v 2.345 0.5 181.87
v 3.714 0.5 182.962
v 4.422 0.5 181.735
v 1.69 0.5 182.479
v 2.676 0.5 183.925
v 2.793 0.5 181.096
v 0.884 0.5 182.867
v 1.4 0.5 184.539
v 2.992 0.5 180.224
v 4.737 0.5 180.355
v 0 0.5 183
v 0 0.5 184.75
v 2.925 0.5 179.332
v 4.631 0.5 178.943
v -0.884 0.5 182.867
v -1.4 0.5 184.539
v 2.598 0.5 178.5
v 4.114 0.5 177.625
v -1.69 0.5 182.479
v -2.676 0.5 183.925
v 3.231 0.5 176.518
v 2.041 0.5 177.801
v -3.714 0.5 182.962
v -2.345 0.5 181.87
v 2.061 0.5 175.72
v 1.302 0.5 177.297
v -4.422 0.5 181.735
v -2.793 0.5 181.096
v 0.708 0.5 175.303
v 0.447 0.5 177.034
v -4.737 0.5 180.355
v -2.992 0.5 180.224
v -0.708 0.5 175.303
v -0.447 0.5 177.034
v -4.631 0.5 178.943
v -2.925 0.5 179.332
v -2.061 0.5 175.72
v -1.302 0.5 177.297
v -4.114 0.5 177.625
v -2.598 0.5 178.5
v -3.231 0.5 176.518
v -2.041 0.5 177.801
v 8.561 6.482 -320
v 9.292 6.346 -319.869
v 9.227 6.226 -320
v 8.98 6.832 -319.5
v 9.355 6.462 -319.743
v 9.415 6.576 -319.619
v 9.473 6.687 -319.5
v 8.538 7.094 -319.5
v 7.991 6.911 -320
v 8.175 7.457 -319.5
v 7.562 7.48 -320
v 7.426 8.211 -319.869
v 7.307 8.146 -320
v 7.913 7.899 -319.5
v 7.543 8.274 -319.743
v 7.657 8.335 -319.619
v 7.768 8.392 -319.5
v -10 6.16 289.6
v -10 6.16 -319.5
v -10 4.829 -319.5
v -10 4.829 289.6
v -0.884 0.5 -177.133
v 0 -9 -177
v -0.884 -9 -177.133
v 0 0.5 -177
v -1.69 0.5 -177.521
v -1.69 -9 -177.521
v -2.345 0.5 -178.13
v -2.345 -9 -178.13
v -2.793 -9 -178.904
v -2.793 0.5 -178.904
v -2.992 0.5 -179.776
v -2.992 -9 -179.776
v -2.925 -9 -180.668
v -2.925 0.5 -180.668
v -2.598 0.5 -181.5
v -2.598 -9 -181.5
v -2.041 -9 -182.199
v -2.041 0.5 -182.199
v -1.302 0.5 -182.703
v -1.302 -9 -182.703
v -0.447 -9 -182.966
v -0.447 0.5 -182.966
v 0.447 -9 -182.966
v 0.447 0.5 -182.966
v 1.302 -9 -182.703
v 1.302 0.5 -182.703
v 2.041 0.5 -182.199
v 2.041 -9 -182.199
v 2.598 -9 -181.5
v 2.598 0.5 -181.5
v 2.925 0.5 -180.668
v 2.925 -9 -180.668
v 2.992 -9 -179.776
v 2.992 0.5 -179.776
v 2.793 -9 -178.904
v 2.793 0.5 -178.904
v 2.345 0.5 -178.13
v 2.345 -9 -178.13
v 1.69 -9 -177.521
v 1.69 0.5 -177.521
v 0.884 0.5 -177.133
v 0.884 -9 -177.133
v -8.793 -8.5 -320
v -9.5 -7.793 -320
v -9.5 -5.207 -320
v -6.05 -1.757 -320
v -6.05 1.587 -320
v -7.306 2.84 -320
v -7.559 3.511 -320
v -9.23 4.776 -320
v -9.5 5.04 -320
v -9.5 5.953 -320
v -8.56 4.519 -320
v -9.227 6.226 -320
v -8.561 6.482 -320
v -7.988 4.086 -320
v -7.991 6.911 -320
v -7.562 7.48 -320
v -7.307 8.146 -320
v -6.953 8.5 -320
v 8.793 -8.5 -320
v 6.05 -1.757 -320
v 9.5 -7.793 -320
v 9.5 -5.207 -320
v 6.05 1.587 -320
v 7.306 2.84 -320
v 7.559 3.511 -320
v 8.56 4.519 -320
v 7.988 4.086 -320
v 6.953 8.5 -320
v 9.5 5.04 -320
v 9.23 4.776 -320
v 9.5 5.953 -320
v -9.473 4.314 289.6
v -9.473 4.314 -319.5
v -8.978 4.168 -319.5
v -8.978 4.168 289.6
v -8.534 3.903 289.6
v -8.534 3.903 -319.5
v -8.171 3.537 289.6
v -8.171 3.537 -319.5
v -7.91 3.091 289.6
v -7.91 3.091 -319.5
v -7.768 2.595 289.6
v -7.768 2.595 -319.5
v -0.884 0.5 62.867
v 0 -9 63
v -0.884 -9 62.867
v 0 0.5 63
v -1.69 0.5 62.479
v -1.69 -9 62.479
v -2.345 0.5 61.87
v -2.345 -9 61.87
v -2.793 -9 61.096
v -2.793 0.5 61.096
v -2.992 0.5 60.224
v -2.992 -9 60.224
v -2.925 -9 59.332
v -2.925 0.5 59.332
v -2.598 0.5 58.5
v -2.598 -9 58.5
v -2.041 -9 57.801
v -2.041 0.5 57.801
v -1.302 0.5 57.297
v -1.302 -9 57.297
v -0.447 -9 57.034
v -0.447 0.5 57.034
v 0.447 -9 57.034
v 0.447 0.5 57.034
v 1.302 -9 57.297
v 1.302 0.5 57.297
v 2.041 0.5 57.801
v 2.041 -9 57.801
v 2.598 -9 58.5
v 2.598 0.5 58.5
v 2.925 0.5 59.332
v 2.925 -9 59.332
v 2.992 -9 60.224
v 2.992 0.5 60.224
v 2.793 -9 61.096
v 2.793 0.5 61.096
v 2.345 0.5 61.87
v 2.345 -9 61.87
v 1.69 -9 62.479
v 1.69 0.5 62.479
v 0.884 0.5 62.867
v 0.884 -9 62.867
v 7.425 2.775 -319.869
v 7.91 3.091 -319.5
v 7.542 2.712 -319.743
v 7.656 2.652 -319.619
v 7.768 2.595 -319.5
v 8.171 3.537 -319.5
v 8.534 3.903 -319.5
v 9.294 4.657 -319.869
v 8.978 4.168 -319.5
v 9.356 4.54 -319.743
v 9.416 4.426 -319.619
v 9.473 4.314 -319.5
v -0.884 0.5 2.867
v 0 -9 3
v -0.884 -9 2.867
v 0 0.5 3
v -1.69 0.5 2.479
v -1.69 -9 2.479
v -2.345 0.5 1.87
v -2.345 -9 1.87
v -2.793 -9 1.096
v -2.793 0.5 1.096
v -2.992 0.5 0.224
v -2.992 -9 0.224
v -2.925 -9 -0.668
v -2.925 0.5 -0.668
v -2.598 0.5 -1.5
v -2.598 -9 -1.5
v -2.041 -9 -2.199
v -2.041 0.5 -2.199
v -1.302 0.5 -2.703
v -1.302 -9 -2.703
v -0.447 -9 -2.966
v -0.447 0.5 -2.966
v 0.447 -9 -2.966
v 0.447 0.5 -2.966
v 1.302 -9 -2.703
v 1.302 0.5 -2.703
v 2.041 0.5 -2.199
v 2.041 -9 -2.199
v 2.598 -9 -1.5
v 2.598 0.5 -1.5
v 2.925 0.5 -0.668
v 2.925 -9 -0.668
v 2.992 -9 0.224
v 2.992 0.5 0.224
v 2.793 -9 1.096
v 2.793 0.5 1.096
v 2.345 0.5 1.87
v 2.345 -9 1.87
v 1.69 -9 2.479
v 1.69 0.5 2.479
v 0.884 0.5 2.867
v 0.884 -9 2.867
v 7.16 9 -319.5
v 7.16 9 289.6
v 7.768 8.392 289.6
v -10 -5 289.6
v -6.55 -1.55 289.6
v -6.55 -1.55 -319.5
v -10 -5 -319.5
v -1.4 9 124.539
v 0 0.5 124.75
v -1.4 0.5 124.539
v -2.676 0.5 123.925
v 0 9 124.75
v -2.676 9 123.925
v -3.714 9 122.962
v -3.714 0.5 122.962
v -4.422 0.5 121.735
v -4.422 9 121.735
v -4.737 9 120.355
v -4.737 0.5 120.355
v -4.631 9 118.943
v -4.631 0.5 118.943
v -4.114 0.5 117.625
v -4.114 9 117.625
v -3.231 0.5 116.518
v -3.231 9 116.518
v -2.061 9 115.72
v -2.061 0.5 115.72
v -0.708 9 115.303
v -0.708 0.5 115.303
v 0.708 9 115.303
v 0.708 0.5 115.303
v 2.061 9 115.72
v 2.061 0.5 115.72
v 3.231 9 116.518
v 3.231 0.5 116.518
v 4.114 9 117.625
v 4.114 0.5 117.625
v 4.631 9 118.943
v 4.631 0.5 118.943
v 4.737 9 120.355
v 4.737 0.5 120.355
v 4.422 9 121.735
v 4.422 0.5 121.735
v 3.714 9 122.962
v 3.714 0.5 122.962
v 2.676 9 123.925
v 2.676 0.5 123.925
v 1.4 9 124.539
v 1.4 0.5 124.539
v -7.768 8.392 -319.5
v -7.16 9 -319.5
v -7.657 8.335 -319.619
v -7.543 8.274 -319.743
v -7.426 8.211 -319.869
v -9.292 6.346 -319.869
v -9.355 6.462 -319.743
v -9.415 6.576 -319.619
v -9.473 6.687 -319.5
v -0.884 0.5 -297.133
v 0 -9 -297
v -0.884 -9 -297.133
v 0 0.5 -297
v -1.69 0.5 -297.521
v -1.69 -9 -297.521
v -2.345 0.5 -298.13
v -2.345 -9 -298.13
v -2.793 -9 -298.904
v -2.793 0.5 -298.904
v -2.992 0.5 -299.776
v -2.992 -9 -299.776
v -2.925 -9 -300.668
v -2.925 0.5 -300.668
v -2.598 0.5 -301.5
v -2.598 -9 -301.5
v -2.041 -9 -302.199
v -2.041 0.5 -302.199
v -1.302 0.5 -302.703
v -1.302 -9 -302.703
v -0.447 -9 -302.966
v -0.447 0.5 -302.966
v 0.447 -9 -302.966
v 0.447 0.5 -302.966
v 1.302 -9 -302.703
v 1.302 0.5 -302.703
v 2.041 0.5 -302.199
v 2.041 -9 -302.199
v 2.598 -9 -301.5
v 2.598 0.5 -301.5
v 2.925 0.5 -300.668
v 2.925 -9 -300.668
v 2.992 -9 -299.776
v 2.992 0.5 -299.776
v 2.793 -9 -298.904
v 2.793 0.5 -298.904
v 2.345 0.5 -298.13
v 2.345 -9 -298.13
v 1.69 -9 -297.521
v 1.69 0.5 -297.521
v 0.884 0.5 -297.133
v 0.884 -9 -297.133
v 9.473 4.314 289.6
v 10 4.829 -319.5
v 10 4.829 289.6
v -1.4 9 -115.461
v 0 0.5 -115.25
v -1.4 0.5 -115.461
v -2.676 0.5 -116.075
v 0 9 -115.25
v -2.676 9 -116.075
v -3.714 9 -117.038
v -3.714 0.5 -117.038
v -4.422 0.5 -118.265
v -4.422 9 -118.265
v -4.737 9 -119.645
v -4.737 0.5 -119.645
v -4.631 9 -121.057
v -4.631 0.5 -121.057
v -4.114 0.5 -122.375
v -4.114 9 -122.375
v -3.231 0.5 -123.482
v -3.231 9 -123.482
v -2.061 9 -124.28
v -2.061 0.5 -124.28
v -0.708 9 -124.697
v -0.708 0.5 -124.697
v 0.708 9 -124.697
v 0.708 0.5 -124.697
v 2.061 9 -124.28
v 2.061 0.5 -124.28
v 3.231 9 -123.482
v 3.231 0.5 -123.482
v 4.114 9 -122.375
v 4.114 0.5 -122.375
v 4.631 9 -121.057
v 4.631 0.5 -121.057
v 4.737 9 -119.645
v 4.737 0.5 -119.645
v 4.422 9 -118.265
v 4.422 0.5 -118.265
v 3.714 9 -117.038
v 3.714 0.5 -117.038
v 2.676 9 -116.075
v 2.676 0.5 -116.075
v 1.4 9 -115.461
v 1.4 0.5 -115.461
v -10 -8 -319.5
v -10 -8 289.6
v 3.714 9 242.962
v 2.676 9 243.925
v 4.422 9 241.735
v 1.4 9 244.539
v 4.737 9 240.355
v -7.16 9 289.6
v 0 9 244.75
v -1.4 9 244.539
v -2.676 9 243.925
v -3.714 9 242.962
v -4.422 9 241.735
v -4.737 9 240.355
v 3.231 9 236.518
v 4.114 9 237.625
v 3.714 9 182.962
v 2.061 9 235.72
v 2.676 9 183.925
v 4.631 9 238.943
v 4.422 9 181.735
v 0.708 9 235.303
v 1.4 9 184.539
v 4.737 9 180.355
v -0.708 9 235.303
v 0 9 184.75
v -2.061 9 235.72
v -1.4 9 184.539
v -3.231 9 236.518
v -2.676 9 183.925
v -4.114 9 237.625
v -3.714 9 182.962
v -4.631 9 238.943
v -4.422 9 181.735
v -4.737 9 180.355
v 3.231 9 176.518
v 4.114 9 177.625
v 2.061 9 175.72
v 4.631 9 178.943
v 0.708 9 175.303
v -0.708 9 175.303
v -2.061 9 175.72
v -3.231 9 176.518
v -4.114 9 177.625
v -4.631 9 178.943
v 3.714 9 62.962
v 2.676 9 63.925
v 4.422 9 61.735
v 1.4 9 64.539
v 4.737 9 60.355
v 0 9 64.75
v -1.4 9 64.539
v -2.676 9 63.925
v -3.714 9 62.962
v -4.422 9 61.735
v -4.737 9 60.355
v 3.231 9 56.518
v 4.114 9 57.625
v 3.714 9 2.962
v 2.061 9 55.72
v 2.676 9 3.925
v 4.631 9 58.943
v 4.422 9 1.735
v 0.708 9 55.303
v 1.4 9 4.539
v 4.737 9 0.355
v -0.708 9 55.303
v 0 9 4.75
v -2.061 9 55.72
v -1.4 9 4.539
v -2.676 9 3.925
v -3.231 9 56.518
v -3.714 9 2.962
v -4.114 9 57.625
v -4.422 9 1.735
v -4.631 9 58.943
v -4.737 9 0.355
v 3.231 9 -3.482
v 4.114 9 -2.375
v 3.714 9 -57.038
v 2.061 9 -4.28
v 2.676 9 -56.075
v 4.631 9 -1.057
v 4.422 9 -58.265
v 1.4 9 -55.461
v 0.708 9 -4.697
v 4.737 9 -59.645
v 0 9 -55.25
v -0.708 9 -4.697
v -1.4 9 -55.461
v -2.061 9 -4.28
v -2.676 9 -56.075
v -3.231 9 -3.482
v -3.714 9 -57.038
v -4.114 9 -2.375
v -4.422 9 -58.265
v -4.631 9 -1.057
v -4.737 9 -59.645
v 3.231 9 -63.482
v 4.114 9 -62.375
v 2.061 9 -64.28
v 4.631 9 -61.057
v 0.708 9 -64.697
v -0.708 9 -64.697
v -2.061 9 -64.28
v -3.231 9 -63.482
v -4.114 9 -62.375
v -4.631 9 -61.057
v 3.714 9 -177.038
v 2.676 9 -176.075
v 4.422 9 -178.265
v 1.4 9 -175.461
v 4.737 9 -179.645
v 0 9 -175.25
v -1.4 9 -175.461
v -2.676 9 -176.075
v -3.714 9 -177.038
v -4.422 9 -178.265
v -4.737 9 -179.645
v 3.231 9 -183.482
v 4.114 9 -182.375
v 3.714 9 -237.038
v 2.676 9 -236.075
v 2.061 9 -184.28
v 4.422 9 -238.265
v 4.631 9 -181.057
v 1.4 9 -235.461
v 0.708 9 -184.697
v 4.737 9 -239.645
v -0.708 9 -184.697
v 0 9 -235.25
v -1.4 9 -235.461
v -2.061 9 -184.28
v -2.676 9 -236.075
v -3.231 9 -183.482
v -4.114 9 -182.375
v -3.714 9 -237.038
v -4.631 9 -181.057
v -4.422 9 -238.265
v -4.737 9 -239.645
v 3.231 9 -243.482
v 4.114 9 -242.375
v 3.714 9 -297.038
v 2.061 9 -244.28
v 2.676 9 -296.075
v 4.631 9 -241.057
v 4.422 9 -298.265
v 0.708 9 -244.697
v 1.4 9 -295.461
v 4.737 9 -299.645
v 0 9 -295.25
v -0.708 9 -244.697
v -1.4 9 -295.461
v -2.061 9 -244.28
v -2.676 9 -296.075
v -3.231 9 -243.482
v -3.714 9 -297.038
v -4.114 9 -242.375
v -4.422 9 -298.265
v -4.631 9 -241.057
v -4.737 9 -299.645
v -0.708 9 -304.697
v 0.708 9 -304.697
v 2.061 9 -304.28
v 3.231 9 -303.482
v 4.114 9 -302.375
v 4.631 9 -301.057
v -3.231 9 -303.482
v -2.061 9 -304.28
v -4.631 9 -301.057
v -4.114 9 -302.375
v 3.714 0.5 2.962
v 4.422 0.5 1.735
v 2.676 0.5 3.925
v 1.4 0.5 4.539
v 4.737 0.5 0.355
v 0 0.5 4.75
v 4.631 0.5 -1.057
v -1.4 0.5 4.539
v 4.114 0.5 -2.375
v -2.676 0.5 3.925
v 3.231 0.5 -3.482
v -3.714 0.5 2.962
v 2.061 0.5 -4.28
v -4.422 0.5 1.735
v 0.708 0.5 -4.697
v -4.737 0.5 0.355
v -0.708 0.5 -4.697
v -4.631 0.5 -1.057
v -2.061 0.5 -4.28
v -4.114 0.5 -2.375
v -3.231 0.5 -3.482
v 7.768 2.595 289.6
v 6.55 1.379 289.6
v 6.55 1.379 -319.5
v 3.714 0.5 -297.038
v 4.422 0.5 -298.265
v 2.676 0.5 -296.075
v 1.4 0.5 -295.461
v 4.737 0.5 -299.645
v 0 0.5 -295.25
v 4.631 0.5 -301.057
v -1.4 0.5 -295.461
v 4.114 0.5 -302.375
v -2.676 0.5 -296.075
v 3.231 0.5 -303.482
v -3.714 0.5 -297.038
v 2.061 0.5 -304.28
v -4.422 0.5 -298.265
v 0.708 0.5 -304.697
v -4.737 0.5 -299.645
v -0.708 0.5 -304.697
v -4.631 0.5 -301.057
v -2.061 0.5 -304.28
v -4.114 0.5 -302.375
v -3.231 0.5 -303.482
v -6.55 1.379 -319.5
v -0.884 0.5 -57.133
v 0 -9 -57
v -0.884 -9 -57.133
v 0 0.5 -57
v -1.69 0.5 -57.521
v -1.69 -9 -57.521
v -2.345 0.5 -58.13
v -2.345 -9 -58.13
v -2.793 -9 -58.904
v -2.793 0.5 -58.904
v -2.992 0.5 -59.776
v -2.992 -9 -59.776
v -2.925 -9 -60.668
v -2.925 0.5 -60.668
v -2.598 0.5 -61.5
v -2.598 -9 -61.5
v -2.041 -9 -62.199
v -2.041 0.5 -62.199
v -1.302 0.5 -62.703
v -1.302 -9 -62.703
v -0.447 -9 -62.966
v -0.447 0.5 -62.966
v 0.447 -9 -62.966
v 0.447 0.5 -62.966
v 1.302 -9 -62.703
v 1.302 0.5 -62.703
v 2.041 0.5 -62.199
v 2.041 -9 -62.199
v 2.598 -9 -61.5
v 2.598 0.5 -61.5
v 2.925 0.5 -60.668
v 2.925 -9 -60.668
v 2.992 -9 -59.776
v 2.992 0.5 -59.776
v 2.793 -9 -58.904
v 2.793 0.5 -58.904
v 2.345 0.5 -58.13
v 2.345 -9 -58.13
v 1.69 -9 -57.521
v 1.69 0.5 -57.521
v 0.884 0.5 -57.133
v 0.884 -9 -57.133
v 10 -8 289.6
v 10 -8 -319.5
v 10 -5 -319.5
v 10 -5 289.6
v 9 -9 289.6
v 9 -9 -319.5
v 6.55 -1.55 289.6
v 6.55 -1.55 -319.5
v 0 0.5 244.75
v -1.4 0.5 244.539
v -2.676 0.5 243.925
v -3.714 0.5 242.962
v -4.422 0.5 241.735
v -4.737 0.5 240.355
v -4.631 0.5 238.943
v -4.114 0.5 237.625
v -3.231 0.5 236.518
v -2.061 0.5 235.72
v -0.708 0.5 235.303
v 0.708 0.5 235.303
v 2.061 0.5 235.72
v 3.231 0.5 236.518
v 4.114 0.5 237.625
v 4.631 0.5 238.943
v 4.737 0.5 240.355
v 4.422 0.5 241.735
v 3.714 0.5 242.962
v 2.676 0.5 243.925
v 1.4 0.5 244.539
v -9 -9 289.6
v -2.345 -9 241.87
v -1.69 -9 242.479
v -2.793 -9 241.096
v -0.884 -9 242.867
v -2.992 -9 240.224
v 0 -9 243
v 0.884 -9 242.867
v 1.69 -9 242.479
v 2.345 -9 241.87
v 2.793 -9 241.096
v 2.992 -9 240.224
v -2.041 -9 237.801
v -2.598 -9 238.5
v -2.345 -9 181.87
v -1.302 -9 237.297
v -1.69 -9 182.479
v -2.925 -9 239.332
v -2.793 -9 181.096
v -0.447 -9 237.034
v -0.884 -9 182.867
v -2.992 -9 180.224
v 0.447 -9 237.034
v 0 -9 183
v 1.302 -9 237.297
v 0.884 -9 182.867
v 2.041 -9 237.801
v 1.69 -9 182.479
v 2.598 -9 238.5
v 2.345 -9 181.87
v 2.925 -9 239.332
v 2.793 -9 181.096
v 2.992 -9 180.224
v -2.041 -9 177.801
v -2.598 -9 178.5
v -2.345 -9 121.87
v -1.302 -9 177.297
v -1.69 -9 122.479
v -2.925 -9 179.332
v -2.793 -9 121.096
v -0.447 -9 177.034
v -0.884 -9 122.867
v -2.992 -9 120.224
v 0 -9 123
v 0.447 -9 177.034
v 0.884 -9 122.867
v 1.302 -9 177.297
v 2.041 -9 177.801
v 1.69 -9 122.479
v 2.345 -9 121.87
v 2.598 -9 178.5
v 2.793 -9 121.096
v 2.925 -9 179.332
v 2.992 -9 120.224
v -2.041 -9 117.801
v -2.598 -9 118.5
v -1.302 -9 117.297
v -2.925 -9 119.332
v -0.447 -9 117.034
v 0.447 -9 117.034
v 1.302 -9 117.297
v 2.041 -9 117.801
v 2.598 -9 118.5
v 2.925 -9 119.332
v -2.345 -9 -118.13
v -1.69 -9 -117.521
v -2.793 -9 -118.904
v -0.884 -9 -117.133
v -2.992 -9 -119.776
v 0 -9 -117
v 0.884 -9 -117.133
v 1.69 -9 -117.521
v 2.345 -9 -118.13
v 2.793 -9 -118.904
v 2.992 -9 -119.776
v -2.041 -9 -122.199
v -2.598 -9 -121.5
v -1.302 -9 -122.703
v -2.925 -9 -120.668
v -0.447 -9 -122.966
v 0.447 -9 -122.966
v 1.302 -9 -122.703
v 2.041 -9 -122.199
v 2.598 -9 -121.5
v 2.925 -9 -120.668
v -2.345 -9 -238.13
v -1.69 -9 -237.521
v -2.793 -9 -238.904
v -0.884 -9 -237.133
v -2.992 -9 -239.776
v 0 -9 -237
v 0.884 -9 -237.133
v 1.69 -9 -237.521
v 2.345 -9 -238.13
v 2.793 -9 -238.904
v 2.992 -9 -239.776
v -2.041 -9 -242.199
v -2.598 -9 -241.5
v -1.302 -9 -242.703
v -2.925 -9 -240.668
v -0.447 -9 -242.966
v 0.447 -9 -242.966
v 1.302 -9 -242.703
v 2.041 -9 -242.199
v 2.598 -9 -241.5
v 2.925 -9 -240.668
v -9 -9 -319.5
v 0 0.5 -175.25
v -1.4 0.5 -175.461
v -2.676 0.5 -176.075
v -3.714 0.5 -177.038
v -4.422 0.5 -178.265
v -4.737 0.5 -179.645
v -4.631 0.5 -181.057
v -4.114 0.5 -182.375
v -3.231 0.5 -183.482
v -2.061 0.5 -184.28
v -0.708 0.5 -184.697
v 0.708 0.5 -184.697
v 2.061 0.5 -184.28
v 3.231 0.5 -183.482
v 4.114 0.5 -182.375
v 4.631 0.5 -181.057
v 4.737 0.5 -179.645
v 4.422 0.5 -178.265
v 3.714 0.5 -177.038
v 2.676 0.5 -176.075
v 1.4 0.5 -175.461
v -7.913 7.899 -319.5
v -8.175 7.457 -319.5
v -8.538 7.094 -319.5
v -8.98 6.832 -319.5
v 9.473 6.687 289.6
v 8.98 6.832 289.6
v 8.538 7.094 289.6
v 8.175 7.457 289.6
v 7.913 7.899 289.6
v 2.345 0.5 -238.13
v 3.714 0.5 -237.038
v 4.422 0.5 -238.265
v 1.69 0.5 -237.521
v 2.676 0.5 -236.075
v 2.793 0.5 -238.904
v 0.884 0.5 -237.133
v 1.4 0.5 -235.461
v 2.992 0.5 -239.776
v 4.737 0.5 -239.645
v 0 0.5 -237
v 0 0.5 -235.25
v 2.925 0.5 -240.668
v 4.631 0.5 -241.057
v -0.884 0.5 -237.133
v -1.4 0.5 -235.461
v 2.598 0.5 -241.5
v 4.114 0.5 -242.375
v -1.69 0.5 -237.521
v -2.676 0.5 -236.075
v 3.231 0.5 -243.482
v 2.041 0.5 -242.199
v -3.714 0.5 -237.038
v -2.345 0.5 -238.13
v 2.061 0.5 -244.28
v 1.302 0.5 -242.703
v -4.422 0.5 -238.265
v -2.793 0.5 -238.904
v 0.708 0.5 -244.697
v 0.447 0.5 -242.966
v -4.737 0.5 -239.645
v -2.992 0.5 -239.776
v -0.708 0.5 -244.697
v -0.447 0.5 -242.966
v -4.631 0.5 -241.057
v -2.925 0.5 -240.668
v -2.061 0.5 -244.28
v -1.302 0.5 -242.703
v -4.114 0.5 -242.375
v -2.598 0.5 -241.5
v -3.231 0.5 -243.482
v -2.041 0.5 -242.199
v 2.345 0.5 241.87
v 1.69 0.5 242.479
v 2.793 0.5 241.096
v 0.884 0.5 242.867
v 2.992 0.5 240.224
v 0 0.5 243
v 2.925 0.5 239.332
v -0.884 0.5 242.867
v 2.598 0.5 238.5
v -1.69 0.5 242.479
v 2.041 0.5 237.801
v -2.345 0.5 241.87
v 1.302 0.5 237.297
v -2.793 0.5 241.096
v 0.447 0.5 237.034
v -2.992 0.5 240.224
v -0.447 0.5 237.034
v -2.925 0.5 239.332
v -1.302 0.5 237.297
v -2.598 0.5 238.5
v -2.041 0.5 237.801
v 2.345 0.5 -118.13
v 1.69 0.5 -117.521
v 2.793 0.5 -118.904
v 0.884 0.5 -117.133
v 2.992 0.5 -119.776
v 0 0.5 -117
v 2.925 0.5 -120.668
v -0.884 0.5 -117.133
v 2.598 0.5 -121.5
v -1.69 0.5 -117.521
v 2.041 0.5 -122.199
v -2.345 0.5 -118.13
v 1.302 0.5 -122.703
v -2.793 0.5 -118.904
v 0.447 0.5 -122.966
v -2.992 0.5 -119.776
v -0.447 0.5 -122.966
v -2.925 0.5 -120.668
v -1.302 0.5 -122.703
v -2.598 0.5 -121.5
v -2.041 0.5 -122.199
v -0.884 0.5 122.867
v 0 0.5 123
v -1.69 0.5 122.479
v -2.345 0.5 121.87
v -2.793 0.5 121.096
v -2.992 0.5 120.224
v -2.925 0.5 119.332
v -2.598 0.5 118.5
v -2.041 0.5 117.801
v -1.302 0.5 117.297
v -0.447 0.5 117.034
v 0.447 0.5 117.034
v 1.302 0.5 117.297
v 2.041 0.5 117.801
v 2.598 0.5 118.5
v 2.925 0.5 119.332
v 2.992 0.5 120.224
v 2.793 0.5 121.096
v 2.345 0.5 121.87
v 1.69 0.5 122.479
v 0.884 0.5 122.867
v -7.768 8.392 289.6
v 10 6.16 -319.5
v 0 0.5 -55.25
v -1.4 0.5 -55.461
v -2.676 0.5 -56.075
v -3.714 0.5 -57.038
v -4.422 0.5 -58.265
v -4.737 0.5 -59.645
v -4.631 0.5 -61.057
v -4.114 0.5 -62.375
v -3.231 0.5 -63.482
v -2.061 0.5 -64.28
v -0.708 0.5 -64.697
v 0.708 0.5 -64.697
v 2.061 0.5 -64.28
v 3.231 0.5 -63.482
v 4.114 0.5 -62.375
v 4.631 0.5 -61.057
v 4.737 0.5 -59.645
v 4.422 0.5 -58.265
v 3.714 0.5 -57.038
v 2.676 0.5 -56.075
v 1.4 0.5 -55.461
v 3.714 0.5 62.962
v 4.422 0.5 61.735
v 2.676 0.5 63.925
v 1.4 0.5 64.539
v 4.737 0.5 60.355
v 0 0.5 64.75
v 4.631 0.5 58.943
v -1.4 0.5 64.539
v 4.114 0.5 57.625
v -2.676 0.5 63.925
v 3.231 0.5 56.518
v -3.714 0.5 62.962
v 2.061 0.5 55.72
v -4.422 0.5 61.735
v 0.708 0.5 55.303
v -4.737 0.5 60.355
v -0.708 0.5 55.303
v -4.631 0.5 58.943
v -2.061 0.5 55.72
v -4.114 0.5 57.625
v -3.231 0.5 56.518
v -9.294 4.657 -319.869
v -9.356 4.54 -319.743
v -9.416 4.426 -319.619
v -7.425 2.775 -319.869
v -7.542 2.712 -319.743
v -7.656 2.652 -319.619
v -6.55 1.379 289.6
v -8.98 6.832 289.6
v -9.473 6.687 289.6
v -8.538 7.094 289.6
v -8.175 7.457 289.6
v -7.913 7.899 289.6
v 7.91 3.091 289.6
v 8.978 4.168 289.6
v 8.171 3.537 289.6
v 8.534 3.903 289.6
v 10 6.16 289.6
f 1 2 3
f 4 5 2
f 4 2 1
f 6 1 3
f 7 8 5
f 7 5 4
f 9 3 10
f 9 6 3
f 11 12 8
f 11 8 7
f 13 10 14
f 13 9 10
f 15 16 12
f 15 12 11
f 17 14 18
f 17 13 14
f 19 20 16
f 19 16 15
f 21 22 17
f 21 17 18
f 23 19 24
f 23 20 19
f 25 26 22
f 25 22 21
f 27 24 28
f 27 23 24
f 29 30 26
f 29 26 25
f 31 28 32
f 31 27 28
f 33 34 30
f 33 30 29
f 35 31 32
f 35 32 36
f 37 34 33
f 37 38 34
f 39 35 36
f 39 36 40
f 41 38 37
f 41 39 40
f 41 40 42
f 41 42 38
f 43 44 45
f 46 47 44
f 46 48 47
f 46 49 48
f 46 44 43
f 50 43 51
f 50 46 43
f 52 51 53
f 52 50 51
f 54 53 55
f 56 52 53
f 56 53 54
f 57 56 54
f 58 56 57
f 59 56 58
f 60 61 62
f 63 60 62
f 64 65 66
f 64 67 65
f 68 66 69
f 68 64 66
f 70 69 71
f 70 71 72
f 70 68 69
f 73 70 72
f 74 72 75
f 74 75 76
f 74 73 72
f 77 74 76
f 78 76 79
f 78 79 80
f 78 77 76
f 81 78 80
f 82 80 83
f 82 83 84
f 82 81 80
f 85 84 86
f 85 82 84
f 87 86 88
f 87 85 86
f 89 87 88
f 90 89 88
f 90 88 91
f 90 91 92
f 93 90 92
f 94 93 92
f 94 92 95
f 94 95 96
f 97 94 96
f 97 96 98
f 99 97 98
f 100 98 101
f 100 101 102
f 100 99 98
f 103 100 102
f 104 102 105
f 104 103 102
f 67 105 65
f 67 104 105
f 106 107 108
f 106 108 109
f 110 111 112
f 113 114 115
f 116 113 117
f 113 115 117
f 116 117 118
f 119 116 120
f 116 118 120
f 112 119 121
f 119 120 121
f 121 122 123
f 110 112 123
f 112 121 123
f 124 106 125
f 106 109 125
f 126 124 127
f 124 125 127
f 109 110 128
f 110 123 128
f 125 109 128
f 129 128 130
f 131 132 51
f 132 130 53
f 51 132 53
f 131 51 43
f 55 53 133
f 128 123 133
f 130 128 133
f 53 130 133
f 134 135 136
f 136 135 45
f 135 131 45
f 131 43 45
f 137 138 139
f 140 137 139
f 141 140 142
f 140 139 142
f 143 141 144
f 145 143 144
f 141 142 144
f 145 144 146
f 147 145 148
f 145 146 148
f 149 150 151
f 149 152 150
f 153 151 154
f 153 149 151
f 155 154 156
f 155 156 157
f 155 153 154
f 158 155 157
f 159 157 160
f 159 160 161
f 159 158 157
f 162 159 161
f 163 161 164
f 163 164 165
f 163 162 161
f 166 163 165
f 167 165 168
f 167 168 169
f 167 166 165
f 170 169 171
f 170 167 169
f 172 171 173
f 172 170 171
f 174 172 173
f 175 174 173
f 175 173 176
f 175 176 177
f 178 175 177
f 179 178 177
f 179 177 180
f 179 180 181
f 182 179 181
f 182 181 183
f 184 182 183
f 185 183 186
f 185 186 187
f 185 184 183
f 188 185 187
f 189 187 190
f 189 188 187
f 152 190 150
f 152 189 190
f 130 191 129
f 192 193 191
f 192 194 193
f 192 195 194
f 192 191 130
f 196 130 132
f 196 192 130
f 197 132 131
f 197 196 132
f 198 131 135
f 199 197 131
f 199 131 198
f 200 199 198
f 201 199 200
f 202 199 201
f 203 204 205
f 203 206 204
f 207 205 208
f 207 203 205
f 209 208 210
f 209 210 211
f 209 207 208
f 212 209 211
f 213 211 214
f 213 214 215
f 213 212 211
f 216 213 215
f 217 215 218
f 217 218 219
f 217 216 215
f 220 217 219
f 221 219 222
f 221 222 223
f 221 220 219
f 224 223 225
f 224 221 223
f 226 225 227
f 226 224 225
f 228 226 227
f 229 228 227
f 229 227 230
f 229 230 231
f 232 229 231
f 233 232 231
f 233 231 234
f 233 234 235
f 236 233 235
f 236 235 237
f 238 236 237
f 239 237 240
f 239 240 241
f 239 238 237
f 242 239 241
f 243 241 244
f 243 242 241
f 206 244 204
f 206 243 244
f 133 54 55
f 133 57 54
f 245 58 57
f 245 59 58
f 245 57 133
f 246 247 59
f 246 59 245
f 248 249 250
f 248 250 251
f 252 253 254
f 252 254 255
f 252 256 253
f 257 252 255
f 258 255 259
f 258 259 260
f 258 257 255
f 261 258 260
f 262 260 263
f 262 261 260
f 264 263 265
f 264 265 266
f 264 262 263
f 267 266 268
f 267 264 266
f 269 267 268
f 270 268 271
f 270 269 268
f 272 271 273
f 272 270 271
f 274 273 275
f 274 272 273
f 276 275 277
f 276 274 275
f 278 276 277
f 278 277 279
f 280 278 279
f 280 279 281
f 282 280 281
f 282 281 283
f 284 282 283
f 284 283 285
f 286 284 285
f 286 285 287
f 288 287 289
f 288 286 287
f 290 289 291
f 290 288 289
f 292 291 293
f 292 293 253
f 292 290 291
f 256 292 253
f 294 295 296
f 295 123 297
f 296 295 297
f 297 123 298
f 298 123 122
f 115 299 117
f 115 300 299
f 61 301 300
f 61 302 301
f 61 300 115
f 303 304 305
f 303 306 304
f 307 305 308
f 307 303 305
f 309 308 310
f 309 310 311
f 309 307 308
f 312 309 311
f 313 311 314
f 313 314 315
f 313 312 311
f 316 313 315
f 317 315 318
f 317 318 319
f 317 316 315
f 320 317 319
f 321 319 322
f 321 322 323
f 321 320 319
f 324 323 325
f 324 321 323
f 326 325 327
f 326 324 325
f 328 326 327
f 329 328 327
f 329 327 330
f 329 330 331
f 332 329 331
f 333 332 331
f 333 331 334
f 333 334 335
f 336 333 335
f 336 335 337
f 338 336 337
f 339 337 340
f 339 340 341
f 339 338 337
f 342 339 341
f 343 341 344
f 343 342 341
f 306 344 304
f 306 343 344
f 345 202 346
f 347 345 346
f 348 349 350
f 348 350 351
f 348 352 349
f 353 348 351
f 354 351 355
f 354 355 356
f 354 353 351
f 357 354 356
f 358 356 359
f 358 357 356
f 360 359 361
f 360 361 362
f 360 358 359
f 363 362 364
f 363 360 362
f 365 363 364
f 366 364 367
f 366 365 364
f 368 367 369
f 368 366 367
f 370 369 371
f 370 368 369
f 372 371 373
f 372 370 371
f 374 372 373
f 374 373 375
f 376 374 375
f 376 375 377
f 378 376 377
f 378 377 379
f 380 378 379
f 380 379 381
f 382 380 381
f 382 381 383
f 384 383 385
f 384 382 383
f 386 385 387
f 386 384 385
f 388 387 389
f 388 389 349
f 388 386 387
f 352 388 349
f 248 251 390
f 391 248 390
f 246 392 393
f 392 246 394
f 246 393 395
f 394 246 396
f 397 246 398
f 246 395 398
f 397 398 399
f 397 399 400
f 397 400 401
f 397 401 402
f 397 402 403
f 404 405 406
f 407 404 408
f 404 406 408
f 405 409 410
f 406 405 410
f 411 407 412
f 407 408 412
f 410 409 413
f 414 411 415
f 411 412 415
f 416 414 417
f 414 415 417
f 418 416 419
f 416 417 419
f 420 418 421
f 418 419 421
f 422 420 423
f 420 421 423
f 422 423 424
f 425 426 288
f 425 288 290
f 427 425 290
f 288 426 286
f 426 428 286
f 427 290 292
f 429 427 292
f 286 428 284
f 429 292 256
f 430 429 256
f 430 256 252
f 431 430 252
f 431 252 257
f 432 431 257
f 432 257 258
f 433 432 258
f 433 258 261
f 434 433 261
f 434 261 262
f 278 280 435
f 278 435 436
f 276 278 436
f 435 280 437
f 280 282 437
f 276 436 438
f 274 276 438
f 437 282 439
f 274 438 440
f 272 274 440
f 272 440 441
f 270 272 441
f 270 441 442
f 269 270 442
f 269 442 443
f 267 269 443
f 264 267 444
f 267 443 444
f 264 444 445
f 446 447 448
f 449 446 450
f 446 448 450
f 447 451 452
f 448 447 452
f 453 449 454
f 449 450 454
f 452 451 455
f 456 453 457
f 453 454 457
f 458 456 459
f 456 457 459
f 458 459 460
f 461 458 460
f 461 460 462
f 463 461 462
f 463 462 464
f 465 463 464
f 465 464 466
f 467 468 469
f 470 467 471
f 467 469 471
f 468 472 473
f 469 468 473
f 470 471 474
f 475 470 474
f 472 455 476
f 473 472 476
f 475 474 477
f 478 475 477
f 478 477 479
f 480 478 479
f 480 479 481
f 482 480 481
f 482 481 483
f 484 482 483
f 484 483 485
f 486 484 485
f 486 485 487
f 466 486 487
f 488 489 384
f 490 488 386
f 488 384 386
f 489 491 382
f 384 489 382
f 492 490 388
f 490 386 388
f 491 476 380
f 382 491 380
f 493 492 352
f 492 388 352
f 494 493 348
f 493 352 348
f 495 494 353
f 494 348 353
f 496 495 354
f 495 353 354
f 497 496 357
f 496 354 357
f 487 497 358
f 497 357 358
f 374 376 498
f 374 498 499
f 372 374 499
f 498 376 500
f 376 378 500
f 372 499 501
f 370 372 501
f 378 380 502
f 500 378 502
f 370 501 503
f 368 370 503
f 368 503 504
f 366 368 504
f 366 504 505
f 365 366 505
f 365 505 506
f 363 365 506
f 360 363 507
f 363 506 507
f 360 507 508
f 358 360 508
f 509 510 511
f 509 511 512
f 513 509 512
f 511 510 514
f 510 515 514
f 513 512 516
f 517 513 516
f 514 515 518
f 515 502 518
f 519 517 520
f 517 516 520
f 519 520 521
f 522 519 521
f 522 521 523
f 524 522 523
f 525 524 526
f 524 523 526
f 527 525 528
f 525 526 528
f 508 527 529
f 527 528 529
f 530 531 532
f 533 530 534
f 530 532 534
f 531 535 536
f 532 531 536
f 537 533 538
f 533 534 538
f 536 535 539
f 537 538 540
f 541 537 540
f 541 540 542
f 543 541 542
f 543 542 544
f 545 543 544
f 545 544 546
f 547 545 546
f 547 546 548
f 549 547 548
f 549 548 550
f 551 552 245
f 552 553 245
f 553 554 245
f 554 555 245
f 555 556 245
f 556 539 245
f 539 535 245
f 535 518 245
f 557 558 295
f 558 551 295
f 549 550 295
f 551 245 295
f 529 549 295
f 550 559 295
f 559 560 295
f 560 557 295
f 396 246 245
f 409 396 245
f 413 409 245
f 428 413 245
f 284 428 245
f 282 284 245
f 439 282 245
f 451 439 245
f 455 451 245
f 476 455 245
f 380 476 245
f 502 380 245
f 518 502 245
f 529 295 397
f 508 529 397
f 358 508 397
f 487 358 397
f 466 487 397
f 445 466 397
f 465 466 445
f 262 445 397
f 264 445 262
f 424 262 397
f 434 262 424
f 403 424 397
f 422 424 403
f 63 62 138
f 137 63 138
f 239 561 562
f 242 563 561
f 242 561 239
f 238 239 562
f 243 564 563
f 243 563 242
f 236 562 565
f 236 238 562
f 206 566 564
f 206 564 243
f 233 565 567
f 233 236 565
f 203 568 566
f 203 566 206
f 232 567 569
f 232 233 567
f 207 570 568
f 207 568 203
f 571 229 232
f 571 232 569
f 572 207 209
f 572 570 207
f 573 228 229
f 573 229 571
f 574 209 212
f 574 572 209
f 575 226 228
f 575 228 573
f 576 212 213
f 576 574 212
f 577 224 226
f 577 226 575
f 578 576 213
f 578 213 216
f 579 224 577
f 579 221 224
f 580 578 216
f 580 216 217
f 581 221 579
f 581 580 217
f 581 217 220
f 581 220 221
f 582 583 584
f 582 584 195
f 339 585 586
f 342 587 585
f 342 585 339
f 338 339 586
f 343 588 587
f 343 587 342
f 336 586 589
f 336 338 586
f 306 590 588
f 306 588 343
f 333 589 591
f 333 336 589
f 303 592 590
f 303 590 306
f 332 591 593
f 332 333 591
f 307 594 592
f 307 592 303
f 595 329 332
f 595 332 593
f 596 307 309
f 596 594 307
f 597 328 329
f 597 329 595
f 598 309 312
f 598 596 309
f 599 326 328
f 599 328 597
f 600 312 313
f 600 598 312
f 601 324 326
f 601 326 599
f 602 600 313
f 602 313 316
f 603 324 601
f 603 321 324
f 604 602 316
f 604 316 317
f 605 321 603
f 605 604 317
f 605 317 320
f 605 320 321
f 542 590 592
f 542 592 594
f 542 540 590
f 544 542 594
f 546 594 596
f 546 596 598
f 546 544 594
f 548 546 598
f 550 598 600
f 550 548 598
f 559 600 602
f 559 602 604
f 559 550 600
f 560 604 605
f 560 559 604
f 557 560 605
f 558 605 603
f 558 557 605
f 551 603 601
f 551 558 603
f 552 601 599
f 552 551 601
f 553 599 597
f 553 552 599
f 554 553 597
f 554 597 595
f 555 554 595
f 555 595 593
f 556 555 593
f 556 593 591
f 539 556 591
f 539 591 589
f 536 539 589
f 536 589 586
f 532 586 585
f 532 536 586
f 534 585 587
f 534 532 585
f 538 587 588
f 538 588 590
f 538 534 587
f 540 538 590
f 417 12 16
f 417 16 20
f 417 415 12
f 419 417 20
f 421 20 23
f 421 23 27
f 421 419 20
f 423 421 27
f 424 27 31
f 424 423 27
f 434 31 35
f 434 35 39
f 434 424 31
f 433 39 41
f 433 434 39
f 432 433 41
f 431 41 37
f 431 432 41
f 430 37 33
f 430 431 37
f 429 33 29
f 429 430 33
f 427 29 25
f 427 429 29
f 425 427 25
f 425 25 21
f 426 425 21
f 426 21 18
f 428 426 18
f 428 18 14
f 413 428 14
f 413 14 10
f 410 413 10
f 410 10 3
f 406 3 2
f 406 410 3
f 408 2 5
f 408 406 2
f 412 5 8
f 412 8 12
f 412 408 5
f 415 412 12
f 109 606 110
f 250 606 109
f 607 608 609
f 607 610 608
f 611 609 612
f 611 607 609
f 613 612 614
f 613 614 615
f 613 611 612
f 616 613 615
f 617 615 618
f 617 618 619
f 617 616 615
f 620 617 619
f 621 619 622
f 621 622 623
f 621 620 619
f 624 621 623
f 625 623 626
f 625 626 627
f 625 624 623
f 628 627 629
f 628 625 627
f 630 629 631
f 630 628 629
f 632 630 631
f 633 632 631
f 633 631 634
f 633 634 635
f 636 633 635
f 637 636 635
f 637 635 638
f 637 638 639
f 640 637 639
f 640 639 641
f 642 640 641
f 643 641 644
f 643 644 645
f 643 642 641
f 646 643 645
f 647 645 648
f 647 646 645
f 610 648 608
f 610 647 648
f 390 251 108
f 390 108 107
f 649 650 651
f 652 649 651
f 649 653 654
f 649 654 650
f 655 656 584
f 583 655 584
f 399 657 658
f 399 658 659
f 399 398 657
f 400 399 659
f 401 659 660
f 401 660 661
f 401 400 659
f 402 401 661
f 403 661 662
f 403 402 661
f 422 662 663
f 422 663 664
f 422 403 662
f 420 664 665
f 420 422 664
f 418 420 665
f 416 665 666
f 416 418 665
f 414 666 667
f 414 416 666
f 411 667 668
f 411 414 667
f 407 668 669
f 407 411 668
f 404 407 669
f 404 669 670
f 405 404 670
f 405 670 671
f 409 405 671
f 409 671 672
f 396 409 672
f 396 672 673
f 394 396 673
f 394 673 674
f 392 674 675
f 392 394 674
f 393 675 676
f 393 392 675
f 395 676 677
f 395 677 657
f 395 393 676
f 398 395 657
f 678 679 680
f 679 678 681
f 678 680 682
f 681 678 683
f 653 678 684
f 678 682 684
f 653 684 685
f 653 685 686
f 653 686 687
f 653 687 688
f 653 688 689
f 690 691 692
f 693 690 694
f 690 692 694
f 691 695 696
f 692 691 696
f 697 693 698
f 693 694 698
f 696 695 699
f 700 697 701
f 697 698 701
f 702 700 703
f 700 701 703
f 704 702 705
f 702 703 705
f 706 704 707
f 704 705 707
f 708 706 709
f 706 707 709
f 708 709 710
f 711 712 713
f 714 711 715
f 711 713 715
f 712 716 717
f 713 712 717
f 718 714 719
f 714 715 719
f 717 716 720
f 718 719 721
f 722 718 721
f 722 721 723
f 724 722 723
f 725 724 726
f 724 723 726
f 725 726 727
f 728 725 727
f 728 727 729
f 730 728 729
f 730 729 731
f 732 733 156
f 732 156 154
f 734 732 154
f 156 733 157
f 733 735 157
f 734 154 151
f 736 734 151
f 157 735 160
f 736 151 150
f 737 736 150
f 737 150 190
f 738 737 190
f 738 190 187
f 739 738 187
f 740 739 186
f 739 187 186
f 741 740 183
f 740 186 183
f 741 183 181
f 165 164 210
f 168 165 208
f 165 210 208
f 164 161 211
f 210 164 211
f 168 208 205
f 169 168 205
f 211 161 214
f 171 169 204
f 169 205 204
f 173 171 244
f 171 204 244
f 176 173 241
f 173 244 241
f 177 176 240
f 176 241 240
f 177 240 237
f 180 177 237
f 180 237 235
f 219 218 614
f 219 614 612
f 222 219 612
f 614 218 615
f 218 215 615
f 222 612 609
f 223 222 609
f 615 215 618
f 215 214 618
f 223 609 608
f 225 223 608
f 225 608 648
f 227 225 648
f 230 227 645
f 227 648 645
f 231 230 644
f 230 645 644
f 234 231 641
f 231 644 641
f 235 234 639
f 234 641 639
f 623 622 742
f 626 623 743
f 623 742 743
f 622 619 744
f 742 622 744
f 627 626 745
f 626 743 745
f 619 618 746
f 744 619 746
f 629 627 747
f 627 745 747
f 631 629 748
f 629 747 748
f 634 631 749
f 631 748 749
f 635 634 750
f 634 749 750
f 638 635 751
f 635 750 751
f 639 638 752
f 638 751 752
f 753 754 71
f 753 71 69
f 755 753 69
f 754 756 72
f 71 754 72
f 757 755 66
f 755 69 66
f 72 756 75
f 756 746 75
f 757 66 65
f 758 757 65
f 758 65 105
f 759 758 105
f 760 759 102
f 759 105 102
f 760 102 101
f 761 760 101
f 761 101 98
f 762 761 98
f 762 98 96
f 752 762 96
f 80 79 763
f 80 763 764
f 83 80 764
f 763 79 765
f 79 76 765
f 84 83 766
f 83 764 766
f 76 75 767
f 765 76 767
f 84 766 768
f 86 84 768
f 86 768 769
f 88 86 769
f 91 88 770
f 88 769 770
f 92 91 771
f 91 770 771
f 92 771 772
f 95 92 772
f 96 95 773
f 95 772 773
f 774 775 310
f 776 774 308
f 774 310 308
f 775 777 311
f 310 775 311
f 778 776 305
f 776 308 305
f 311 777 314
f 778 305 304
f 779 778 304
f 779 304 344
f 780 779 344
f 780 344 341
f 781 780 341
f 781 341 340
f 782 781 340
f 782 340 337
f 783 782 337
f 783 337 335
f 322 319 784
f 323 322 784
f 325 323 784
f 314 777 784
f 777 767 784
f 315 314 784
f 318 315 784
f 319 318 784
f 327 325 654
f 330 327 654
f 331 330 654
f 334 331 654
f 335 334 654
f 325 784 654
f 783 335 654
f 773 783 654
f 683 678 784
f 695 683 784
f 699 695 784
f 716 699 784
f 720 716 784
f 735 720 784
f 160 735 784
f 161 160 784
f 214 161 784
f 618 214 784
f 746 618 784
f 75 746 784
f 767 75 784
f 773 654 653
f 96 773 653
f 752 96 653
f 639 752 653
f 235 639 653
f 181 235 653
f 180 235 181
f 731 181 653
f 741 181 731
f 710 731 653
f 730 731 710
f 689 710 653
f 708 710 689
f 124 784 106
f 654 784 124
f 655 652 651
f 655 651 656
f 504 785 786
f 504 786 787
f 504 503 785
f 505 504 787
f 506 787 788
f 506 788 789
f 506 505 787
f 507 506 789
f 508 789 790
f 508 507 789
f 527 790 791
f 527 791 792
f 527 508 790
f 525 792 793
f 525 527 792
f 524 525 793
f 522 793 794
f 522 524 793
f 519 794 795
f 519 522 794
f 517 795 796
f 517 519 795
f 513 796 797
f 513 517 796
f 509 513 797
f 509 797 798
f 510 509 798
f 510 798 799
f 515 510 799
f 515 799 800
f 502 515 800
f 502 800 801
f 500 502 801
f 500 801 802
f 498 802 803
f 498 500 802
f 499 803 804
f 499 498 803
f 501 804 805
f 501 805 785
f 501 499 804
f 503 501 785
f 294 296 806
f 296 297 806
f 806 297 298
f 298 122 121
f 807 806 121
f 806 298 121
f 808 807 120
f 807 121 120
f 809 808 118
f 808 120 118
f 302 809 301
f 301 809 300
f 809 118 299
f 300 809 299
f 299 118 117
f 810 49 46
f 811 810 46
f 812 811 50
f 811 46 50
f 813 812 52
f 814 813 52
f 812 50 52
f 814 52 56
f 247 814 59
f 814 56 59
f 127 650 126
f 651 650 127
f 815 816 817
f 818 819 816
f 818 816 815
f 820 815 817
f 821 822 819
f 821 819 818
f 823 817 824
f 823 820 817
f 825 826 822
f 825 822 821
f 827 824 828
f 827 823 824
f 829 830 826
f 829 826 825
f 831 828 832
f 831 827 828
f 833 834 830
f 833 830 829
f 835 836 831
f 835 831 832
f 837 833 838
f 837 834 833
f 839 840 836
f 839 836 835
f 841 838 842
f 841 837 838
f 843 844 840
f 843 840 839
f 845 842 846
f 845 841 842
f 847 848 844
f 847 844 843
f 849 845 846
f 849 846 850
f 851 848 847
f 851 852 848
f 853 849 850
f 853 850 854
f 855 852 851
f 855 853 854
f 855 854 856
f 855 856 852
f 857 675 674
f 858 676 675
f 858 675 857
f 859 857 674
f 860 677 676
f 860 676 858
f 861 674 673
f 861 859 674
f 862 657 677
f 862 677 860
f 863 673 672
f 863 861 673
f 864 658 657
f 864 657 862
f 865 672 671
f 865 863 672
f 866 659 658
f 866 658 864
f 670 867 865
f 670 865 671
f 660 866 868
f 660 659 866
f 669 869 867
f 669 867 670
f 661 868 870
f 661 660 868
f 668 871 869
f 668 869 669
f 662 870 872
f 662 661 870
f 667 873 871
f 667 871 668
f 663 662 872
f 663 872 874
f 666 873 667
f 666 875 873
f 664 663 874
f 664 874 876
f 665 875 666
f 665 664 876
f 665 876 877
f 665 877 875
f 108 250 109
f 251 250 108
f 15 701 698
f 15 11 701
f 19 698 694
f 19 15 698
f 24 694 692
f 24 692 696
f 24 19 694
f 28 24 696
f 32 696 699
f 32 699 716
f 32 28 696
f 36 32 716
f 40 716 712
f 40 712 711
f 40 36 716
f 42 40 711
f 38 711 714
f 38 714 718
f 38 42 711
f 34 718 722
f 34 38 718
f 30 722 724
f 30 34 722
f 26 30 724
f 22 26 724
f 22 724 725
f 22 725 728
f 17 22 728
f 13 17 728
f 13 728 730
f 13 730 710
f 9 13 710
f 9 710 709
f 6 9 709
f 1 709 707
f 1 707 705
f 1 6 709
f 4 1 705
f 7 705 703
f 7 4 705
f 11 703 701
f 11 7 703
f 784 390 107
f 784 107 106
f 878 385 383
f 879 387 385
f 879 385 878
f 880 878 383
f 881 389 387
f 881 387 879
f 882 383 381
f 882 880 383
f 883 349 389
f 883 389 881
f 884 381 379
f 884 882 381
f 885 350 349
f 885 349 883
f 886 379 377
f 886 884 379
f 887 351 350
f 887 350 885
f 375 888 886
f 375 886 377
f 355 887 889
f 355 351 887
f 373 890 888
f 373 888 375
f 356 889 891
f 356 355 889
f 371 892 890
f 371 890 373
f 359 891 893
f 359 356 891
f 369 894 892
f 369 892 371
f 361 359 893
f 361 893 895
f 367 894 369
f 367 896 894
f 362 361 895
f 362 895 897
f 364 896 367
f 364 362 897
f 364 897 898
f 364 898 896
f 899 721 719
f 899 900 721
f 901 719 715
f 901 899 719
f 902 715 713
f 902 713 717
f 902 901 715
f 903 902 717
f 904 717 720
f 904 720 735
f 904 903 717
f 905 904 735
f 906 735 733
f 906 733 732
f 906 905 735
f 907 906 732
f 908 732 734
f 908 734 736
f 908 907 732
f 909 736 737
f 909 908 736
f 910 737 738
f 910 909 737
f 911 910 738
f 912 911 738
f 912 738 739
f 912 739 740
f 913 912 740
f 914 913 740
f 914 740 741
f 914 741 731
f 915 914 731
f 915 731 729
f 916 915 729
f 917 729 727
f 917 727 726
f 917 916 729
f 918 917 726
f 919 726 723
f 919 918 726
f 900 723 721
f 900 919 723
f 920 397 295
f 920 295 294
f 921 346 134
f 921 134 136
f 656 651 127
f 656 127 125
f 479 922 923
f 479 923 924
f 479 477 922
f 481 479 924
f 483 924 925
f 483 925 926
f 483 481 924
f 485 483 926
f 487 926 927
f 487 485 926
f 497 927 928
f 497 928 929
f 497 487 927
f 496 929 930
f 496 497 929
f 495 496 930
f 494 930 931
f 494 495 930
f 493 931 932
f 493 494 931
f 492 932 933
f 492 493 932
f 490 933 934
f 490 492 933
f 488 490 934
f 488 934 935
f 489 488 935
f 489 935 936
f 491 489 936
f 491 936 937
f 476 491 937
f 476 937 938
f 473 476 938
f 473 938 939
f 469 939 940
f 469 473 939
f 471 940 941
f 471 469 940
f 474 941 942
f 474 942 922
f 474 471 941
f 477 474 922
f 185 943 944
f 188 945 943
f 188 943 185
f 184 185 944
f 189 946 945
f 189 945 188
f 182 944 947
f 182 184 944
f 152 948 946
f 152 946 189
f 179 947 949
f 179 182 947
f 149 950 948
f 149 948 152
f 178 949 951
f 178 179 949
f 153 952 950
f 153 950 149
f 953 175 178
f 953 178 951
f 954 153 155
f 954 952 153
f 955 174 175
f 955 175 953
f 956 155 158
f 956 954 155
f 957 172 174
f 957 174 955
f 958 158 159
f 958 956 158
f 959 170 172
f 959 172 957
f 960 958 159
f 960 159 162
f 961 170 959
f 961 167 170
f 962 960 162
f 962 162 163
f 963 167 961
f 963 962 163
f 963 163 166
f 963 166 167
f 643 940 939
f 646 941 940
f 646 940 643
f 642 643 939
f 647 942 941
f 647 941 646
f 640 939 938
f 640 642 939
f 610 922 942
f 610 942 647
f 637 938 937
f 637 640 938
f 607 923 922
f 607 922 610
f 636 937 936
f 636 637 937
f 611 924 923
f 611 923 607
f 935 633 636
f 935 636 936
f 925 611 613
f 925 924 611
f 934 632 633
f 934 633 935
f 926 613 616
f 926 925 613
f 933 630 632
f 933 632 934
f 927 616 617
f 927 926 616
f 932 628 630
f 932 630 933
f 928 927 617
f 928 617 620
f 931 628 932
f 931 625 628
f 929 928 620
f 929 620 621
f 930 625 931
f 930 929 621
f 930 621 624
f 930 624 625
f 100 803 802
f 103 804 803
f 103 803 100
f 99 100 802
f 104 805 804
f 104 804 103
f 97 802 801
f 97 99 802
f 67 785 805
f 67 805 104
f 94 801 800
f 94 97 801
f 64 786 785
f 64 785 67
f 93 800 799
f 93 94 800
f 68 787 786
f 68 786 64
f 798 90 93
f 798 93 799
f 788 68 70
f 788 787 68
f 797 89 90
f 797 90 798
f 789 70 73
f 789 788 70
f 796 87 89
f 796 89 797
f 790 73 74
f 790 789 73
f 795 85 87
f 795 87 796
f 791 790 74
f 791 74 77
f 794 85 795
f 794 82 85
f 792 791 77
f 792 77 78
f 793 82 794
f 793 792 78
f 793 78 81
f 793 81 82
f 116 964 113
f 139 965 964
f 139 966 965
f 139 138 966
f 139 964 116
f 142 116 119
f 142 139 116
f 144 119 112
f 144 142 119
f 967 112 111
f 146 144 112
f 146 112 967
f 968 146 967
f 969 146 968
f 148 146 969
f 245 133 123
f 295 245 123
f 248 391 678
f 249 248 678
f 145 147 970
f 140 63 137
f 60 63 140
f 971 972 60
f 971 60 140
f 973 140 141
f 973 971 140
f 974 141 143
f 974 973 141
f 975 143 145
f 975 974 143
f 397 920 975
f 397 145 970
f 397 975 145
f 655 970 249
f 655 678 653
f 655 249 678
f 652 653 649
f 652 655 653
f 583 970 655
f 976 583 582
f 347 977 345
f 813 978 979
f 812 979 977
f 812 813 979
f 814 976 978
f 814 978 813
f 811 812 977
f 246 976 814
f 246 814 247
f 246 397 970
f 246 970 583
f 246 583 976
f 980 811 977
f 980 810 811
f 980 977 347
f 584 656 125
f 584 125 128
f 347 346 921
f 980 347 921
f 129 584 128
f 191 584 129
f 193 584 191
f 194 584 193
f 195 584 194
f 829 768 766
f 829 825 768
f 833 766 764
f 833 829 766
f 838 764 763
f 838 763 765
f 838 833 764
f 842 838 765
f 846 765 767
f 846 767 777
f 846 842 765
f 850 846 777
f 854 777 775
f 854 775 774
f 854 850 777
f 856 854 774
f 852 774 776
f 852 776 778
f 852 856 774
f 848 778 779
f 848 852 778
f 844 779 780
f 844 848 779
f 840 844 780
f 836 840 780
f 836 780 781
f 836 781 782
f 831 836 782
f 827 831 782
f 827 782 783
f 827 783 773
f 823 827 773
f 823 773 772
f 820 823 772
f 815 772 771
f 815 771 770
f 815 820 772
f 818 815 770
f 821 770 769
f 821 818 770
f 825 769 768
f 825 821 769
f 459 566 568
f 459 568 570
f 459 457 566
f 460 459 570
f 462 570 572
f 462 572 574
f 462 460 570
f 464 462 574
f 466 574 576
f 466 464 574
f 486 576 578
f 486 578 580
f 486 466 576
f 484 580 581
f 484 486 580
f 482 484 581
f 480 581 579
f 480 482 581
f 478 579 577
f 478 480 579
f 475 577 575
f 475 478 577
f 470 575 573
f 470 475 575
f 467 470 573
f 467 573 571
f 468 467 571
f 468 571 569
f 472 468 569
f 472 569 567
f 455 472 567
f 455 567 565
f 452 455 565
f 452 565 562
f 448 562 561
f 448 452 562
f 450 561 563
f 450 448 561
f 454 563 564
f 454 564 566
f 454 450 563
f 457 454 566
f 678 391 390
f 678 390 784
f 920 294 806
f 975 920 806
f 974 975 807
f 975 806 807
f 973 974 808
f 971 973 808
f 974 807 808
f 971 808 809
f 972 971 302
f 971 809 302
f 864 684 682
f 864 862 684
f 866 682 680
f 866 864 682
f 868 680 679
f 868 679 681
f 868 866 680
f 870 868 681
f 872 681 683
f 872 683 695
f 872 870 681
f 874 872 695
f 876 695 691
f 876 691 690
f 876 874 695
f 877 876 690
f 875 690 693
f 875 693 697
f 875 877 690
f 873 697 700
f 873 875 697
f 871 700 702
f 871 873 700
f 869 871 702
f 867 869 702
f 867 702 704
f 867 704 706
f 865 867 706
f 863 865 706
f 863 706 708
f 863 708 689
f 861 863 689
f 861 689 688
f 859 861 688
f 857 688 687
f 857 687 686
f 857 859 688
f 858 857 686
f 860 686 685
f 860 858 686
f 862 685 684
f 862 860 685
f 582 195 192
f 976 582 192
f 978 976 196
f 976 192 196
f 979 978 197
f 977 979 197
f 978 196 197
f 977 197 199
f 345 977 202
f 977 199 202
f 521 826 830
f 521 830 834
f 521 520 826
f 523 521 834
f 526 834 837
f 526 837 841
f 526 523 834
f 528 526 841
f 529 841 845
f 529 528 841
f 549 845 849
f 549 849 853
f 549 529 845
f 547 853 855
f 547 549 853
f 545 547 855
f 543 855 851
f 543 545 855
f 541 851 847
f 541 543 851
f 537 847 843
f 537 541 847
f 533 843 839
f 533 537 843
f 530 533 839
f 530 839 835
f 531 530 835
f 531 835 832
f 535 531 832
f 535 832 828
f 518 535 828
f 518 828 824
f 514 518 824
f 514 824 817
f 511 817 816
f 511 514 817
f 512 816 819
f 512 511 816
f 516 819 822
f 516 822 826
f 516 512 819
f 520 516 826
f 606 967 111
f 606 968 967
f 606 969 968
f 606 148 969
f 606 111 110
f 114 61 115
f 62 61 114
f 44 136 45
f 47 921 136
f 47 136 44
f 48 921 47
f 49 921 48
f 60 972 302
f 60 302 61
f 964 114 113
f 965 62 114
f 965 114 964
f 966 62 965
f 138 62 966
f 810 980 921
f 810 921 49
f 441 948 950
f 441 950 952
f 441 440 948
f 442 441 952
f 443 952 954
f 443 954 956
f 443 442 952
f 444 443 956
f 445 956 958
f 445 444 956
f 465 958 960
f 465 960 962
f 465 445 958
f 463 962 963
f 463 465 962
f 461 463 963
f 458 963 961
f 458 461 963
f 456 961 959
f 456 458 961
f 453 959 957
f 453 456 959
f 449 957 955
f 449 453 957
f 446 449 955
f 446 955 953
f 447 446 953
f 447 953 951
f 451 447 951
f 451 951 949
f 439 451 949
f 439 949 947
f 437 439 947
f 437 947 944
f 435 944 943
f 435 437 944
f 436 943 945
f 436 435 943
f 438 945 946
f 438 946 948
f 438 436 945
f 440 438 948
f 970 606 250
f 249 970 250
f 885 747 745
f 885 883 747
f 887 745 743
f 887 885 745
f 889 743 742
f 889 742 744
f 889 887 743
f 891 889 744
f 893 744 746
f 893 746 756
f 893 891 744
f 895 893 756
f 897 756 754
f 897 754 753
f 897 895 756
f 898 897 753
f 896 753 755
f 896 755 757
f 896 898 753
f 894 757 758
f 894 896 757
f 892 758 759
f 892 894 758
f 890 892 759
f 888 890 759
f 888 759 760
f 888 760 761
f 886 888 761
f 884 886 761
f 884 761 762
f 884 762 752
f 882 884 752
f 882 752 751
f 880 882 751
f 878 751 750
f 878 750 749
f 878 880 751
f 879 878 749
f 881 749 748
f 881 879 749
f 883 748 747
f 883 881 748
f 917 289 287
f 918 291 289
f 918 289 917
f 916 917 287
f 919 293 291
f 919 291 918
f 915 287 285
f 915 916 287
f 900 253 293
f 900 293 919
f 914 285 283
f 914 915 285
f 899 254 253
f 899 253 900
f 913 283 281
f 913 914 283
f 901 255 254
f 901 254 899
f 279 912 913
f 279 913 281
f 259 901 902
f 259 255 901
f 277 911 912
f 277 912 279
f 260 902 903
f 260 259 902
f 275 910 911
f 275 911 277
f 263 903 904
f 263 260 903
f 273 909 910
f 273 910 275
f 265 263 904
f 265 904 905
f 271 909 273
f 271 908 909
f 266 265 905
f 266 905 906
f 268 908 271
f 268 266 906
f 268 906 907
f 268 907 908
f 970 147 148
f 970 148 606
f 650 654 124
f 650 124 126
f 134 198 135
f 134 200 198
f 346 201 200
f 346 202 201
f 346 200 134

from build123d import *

# Parameters (mm, degrees)
BOSS_EXTRUDE1_DEPTH      = 320
BOSS_EXTRUDE1_DEPTH_BACK = 320
LPATTERN2_COUNT          = 11
LPATTERN2_PITCH          = 60
CHAMFER1_SIZE            = 0.5
CUT_EXTRUDE1_DEPTH       = 321.661815625
CUT_EXTRUDE1_DEPTH_BACK  = 321.661815625


with BuildPart() as part:
    # Sketch3 → Boss-Extrude1 (new, two sides: drawn at the far end of the back side and taken through both)
    with BuildSketch(Plane.XY.offset(-BOSS_EXTRUDE1_DEPTH_BACK)):
        with BuildLine():
            Line((3, 9), (-3, 9))
            Line((-3, 9), (-7.160036564, 9))
            Line((-7.160036564, 9), (-7.767930373, 8.392105714))
            ThreePointArc((-7.767930373, 8.392105714), (-8.344874488, 7.264307267), (-9.472673258, 6.687363783))
            Line((-9.472673258, 6.687363783), (-10, 6.160037041))
            Line((-10, 6.160037041), (-10, 4.82918644))
            Line((-10, 4.82918644), (-9.472673258, 4.314376637))
            ThreePointArc((-9.472673258, 4.314376637), (-8.341068744, 3.731631743), (-7.767930373, 2.595131504))
            Line((-7.767930373, 2.595131504), (-6.550048828, 1.379235268))
            Line((-6.550048828, 1.379235268), (-6.550048828, -1.550048828))
            Line((-6.550048828, -1.550048828), (-10, -4.999922752))
            Line((-10, -4.999922752), (-10, -8))
            Line((-10, -8), (-9, -9))
            Line((-9, -9), (0, -9))
            Line((0, -9), (9, -9))
            Line((9, -9), (10, -8))
            Line((10, -8), (10, -4.999922752))
            Line((10, -4.999922752), (6.550048828, -1.550048828))
            Line((6.550048828, -1.550048828), (6.550048828, 1.379235268))
            Line((6.550048828, 1.379235268), (7.767930373, 2.595131504))
            ThreePointArc((7.767930373, 2.595131504), (8.341068744, 3.731631743), (9.472673258, 4.314376637))
            Line((9.472673258, 4.314376637), (10, 4.82918644))
            Line((10, 4.82918644), (10, 6.160037041))
            Line((10, 6.160037041), (9.472673258, 6.687363783))
            ThreePointArc((9.472673258, 6.687363783), (8.344874488, 7.264307267), (7.767930373, 8.392105714))
            Line((7.767930373, 8.392105714), (7.160036564, 9))
            Line((7.160036564, 9), (3, 9))
        make_face()
    extrude(amount=BOSS_EXTRUDE1_DEPTH + BOSS_EXTRUDE1_DEPTH_BACK)

    # Sketch4 → Cut-Revolve1 (revolve, cut)
    with BuildSketch(Plane(origin=(0, 0, 0), x_dir=(0, 0, -1), z_dir=(1, 0, 0)), mode=Mode.PRIVATE) as cut_revolve1_sk:
        Polygon((-295.25, 9), (-300, 9), (-300, -9), (-297, -9), (-297, 0.5), (-295.25, 0.5), align=None)
    cut_revolve1 = revolve(cut_revolve1_sk.sketch.rotate(Axis((0, 9, 300), (0, -1, 0)), 180), axis=Axis((0, 9, 300), (0, -1, 0)), mode=Mode.SUBTRACT)

    # LPattern2: Cut-Revolve1 ×11
    with Locations(*[(0, 0, -i * LPATTERN2_PITCH) for i in range(1, LPATTERN2_COUNT)]):
        add(cut_revolve1, mode=Mode.SUBTRACT)

    # Chamfer1
    chamfer1_edges = [part.edges().sort_by_distance(p)[0] for p in [
        (-6.550048828, -0.08540678, 320),
        (-8.275024414, -3.27498579, 320),
        (-10, -6.499961376, 320),
        (-9.5, -8.5, 320),
        (0, -9, 320),
        (9.5, -8.5, 320),
        (10, -6.499961376, 320),
        (8.275024414, -3.27498579, 320),
        (6.550048828, -0.08540678, 320),
        (-8.341068744, 3.731631743, 320),
        (7.158989601, 1.987183386, 320),
        (8.341068744, 3.731631743, 320),
        (9.736336629, 4.571781538, 320),
        (-9.736336629, 4.571781538, -320),
        (-10, 5.49461174, -320),
        (10, 5.49461174, 320),
        (-9.736336629, 6.423700412, -320),
        (-7.463983469, 8.696052857, -320),
        (0, 9, -320),
        (7.463983469, 8.696052857, -320),
        (9.736336629, 6.423700412, -320),
        (10, 5.49461174, -320),
        (9.736336629, 6.423700412, 320),
        (9.736336629, 4.571781538, -320),
        (7.158989601, 1.987183386, -320),
        (6.550048828, -0.08540678, -320),
        (8.275024414, -3.27498579, -320),
        (10, -6.499961376, -320),
        (9.5, -8.5, -320),
        (0, -9, -320),
        (8.344874488, 7.264307267, 320),
        (-9.5, -8.5, -320),
        (-10, -6.499961376, -320),
        (-8.275024414, -3.27498579, -320),
        (-6.550048828, -0.08540678, -320),
        (-7.158989601, 1.987183386, -320),
        (-8.341068744, 3.731631743, -320),
        (-8.344874488, 7.264307267, -320),
        (8.344874488, 7.264307267, -320),
        (8.341068744, 3.731631743, -320),
        (7.463983469, 8.696052857, 320),
        (0, 9, 320),
        (-7.463983469, 8.696052857, 320),
        (-8.344874488, 7.264307267, 320),
        (-7.158989601, 1.987183386, 320),
        (-9.736336629, 6.423700412, 320),
        (-10, 5.49461174, 320),
        (-9.736336629, 4.571781538, 320),
    ]]
    chamfer(chamfer1_edges, length=CHAMFER1_SIZE)

    # Sketch7 → Cut-Extrude1 (cut, two sides: drawn at the far end of the back side and taken through both)
    with BuildSketch(Plane.XZ.offset(9).offset(-CUT_EXTRUDE1_DEPTH_BACK)):
        Polygon((1255.011383847, 289.6), (23.92488735, 289.6), (-18.541494628, 289.6), (-1249.627991125, 289.6), (-1249.627991125, 2751.772992994), (1255.011383847, 2751.772992994), align=None)
    extrude(amount=CUT_EXTRUDE1_DEPTH + CUT_EXTRUDE1_DEPTH_BACK, mode=Mode.SUBTRACT)


solid = part.part
